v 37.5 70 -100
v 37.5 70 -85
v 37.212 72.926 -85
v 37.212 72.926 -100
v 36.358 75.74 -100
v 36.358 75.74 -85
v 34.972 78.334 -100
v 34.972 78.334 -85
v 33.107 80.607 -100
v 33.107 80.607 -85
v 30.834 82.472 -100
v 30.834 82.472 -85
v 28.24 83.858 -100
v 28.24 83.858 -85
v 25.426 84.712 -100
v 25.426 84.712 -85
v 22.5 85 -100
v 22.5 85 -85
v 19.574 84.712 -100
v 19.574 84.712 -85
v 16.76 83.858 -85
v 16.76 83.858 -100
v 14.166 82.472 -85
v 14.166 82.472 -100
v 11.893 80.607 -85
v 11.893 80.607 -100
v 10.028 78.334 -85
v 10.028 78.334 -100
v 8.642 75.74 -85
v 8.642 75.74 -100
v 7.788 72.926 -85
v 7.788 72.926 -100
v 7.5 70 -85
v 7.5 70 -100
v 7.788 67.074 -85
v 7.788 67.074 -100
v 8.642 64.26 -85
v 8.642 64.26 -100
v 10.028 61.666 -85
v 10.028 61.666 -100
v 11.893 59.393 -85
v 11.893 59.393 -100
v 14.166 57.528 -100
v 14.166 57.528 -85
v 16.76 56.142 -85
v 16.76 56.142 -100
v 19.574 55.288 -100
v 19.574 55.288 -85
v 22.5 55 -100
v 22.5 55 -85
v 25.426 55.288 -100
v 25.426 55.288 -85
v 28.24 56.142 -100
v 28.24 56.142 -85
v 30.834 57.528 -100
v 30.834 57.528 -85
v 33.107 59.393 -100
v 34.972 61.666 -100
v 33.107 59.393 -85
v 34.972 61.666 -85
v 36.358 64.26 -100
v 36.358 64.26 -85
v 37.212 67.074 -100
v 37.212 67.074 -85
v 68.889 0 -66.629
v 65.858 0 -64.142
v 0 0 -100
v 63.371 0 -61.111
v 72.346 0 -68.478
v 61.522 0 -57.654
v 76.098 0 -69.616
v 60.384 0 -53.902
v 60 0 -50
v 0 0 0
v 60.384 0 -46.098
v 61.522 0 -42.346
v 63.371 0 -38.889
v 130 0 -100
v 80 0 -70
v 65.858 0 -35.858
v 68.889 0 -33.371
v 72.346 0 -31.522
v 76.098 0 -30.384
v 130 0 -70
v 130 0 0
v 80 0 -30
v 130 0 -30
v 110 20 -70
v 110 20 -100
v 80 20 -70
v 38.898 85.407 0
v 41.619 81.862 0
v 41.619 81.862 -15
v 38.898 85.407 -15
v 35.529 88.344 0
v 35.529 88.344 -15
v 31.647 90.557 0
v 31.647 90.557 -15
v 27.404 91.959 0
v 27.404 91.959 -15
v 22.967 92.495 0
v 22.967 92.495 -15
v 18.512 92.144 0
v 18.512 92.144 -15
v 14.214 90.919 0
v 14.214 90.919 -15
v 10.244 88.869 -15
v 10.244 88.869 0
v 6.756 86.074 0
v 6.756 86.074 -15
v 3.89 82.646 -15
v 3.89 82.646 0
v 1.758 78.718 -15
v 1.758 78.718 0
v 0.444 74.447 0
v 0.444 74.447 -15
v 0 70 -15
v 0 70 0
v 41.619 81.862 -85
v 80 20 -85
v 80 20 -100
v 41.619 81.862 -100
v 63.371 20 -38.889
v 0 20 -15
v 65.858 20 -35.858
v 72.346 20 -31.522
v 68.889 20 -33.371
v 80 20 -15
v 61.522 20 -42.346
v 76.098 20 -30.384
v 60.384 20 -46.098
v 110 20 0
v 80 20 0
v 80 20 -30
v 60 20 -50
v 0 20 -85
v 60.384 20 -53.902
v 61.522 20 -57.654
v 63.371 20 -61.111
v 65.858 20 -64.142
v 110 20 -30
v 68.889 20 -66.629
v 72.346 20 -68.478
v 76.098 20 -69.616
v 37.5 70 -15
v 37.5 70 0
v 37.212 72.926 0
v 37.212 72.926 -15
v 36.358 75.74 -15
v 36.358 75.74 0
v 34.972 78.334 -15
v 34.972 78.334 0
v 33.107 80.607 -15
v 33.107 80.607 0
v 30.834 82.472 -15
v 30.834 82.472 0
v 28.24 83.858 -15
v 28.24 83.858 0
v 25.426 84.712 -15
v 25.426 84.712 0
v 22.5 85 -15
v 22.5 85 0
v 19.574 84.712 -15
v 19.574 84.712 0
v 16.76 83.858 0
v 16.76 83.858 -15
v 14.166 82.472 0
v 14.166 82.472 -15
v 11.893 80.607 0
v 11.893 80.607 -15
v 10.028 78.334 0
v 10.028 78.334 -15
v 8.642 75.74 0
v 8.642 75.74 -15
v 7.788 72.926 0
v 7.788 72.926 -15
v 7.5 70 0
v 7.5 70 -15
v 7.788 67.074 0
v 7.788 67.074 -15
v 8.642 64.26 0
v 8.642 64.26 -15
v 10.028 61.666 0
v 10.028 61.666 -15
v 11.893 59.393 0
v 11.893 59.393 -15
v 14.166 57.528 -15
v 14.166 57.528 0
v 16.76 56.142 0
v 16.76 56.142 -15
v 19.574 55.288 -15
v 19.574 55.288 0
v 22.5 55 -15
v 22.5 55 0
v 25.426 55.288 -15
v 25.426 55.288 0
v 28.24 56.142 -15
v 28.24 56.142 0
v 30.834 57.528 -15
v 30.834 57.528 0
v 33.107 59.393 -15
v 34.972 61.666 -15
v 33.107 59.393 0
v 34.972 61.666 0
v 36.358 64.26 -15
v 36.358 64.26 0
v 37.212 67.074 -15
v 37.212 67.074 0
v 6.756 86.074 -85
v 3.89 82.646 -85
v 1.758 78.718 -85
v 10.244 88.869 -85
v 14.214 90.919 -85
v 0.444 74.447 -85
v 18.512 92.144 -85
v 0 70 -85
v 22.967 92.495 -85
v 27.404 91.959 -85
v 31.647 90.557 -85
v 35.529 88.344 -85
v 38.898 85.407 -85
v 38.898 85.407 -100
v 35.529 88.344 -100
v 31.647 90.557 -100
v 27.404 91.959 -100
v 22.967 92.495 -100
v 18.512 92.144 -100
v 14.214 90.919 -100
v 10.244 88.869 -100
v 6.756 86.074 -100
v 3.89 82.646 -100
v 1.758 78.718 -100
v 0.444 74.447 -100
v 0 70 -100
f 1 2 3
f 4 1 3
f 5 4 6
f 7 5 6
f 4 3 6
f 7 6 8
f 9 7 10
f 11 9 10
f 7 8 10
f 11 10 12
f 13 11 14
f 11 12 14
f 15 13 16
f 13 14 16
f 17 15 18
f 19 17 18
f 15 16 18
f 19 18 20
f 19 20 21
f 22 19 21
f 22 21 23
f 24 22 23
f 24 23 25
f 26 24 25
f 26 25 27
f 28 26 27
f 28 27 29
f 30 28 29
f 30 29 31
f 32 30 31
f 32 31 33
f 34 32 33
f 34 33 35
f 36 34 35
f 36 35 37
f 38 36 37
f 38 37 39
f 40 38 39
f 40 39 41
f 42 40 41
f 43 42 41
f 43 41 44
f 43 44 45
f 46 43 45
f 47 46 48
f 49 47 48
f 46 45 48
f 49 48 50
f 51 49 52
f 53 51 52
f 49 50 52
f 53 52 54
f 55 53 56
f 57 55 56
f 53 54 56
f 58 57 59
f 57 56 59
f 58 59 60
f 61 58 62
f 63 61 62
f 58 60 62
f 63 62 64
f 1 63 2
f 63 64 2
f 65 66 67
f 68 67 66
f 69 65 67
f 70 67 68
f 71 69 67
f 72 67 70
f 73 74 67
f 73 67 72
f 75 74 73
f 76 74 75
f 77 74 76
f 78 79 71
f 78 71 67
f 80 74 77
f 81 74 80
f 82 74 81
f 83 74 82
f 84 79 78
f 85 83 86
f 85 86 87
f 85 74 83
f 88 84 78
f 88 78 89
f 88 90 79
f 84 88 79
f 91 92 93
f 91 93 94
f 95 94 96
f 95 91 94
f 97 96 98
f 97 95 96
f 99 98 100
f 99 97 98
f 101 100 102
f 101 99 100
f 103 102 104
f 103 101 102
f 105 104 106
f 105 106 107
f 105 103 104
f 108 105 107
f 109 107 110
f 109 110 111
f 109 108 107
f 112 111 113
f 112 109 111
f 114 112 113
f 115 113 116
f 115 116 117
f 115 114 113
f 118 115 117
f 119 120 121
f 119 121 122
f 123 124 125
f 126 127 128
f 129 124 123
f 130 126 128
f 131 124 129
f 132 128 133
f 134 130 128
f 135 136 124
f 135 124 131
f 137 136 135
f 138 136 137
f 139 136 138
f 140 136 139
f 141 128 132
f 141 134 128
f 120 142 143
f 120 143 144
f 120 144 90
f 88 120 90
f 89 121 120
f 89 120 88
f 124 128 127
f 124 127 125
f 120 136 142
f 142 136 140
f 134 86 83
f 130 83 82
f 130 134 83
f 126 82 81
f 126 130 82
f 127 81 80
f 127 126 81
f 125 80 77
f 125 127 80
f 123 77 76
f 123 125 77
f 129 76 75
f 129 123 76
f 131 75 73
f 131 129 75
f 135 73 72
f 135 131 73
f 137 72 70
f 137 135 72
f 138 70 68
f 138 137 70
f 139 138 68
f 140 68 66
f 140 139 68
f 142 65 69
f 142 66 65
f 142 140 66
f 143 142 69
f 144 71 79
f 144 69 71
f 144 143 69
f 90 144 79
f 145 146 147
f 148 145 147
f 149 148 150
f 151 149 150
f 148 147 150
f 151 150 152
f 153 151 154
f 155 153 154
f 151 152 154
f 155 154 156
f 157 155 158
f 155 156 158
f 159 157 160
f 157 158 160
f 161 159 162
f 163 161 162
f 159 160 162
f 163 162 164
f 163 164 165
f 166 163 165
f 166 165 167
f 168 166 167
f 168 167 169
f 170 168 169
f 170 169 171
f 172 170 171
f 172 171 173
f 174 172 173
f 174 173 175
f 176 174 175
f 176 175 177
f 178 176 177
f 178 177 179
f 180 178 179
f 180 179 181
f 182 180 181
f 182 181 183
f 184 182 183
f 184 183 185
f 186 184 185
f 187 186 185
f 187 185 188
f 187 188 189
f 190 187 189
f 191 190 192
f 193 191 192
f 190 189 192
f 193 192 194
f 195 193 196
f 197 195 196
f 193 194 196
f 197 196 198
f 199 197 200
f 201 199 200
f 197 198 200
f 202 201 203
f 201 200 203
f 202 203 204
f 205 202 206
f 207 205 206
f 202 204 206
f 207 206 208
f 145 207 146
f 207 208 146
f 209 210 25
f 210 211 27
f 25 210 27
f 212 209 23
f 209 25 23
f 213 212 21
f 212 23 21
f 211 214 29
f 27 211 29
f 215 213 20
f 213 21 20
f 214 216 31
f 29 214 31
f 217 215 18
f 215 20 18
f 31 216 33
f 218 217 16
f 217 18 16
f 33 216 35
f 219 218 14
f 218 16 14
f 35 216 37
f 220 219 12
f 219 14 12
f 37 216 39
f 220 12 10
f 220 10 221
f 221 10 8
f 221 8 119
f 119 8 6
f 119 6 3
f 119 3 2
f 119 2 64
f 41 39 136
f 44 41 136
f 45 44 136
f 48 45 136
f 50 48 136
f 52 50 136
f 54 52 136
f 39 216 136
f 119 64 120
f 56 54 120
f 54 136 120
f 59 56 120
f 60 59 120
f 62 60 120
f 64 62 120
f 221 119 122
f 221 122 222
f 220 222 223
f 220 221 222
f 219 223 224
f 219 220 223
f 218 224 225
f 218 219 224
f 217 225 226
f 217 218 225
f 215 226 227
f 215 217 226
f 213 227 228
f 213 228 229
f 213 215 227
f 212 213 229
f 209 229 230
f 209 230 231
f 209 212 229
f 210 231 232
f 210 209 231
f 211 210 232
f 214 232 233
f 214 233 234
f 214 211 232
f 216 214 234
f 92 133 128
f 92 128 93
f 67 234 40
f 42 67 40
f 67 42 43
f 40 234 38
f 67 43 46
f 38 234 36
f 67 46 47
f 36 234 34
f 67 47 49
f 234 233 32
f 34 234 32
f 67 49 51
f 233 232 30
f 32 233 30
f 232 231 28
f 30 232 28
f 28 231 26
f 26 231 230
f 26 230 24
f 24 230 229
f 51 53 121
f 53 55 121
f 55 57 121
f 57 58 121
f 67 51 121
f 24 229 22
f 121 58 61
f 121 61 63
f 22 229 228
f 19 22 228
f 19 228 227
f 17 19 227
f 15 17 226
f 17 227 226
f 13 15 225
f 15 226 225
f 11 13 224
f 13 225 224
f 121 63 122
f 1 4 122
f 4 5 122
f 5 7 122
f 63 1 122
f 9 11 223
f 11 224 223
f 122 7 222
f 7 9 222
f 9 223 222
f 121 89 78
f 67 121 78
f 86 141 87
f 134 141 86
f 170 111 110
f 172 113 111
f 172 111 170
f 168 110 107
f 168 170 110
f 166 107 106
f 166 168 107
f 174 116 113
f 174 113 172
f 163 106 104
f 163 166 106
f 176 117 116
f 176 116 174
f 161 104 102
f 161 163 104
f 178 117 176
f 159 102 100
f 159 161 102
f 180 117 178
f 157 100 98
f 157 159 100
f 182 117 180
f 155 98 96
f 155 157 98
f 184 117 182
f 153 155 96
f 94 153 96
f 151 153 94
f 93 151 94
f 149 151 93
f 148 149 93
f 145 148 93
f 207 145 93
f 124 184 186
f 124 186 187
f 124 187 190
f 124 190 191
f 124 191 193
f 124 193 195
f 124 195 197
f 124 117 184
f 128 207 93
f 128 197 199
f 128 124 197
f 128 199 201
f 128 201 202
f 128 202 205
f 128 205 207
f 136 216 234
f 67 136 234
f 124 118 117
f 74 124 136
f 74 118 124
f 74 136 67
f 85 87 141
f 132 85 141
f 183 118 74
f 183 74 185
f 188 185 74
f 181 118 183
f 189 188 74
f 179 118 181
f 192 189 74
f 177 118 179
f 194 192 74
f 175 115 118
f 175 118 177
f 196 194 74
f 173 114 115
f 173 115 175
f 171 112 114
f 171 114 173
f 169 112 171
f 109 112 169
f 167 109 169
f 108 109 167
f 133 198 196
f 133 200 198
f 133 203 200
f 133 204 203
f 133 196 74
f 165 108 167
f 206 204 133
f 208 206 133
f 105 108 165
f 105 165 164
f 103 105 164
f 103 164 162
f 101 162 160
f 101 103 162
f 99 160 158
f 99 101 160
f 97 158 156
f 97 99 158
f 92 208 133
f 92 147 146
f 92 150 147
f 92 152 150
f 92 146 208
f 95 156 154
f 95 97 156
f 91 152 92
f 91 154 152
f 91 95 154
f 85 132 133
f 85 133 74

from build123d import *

# Parameters (mm, degrees)
SKETCH1_R           = 22.5
SKETCH1_R_2         = 15
BOSS_EXTRUDE1_DEPTH = 100
SKETCH2_W           = 167.207150193
SKETCH2_H           = 70
CUT_EXTRUDE1_DEPTH  = 73.5
CUT_EXTRUDE2_DEPTH  = 21


with BuildPart() as part:
    # Sketch1 → Boss-Extrude1 (new body)
    with BuildSketch(Plane.XY):
        with BuildLine():
            Line((0, 70), (0, 0))
            Line((0, 0), (130, 0))
            Line((130, 0), (110, 20))
            Line((110, 20), (80, 20))
            Line((80, 20), (41.61915802, 81.862031723))
            ThreePointArc((41.61915802, 81.862031723), (44.138288466, 76.16720944), (45, 70))
            ThreePointArc((45, 70), (22.5, 47.5), (0, 70))
        make_face()
        with Locations((22.5, 70)):
            Circle(SKETCH1_R)
        with Locations((22.5, 70)):
            Circle(SKETCH1_R_2, mode=Mode.SUBTRACT)
    extrude(amount=-BOSS_EXTRUDE1_DEPTH)

    # Sketch2 → Cut-Extrude1 (cut, through all)
    with BuildSketch(Plane(origin=(0, 20, 0), x_dir=(1, 0, 0), z_dir=(0, 1, 0))):
        with Locations((64.505889037, 50)):
            Rectangle(SKETCH2_W, SKETCH2_H)
    extrude(amount=CUT_EXTRUDE1_DEPTH, mode=Mode.SUBTRACT)

    # Sketch3 → Cut-Extrude2 (cut, through all)
    with BuildSketch(Plane(origin=(0, 20, 0), x_dir=(1, 0, 0), z_dir=(0, 1, 0))):
        with BuildLine():
            Line((80, 70), (130, 70))
            Line((130, 70), (130, 30))
            Line((130, 30), (80, 30))
            ThreePointArc((80, 30), (60, 50), (80, 70))
        make_face()
    extrude(amount=-CUT_EXTRUDE2_DEPTH, mode=Mode.SUBTRACT)


solid = part.part
